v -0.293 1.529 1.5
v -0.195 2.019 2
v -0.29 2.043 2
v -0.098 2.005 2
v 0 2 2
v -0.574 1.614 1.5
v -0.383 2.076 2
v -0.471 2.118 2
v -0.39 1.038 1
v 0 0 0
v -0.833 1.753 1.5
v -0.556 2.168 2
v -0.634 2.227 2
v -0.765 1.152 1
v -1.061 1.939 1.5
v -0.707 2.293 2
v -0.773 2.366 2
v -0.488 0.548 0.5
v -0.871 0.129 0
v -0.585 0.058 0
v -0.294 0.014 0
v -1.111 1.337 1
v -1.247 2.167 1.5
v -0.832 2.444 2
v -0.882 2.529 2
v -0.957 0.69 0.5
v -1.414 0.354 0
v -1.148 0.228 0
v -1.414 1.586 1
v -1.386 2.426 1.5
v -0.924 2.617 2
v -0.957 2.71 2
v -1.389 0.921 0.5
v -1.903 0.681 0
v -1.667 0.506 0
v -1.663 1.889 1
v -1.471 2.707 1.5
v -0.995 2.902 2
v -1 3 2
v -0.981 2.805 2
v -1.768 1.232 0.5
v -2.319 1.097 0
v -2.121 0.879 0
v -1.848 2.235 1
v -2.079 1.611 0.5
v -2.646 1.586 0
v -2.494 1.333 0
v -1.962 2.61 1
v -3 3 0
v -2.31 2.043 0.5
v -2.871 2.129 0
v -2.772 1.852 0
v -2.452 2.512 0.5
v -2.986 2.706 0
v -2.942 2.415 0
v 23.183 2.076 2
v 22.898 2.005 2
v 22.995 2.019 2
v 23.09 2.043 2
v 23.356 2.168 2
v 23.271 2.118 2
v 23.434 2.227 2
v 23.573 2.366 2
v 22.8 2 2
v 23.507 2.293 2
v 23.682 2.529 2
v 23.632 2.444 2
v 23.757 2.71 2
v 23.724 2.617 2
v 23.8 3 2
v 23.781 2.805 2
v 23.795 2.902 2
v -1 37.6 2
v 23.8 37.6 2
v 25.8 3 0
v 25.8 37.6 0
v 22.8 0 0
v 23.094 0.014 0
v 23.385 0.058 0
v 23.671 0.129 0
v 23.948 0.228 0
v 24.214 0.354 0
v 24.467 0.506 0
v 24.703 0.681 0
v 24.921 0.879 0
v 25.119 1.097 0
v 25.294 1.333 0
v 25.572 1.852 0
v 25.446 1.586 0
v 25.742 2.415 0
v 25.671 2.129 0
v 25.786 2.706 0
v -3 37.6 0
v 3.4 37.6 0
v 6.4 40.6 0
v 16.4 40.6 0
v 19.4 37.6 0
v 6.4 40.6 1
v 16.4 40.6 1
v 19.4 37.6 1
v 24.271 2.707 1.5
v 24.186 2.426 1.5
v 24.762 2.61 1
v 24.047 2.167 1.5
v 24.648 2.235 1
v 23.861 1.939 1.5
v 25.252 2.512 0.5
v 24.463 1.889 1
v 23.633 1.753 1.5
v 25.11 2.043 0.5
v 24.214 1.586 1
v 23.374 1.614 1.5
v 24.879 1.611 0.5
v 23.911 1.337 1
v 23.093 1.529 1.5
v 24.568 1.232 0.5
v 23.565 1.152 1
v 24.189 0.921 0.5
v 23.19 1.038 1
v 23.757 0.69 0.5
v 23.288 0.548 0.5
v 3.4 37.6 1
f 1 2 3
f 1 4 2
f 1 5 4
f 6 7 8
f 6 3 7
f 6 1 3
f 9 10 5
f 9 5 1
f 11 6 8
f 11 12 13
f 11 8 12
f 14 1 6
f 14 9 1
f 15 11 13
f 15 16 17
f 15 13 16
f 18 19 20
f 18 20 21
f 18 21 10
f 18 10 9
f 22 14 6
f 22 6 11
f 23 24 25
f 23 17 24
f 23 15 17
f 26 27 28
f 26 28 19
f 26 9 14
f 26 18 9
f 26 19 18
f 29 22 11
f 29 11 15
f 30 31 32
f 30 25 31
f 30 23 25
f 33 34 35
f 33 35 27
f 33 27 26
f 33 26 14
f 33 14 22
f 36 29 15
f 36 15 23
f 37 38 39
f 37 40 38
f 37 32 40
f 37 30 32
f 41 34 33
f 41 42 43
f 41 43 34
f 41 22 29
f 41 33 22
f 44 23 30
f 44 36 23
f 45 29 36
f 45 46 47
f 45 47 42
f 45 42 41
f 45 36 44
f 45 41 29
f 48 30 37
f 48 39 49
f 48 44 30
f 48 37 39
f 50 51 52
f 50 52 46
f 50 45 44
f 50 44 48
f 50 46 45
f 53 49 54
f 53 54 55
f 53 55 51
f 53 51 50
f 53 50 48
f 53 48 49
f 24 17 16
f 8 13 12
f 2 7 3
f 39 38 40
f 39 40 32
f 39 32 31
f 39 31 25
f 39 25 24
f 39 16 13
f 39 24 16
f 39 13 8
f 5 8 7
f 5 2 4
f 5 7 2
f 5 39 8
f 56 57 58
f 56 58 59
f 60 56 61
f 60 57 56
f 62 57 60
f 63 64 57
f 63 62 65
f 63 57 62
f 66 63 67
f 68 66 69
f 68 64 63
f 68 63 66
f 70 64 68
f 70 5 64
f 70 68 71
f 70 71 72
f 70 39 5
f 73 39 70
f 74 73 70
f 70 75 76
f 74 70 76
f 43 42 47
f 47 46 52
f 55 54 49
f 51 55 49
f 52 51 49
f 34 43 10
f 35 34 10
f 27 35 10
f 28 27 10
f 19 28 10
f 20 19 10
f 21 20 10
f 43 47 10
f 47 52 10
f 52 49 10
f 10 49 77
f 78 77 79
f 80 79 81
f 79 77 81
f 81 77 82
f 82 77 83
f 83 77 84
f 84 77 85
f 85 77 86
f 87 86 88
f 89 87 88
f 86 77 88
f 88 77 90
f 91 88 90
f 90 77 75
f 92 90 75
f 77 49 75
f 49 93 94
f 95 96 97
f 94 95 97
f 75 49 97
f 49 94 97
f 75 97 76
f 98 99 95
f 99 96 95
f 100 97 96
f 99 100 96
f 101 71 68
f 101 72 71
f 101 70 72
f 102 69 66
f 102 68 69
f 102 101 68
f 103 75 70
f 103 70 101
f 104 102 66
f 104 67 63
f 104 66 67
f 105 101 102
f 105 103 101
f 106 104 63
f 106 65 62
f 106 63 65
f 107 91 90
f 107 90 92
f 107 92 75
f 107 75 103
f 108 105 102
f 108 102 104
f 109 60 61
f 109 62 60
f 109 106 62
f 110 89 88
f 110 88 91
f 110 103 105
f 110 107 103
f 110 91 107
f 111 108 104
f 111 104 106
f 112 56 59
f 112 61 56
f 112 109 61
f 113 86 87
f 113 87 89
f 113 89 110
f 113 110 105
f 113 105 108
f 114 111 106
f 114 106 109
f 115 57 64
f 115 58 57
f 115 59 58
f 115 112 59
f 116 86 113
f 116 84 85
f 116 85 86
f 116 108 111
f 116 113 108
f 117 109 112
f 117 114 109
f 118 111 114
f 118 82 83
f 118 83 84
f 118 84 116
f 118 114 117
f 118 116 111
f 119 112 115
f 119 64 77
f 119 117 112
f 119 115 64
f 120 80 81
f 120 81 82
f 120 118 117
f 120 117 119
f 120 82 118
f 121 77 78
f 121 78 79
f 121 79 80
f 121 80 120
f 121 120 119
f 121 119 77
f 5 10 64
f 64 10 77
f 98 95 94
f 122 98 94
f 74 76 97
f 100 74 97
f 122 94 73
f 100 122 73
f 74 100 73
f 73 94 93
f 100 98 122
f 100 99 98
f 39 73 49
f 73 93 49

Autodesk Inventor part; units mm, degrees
ref_plane "YZ Plane" through (0, 0, 0) normal (1, 0, 0) x (0, 1, 0)
ref_plane "XZ Plane" through (0, 0, 0) normal (0, 1, 0) x (-1, 0, 0)
ref_plane "XY Plane" through (0, 0, 0) normal (0, 0, 1) x (1, 0, 0)
sketch "Skizze1" plane through (0, 0, 0) normal (0, 0, 1) x (1, 0, 0)
  line L0 (3.4, 37.6) -> (-3, 37.6)
  line L1 (-3, 37.6) -> (-3, 3)
  arc A0 (-3, 3) -> (0, 0) centre (0, 3) ccw
  line L2 (0, 0) -> (22.8, 0)
  arc A1 (22.8, 0) -> (25.8, 3) centre (22.8, 3) ccw
  line L3 (25.8, 3) -> (25.8, 37.6)
  line L4 (25.8, 37.6) -> (19.4, 37.6)
  line L5 (19.4, 37.6) -> (16.4, 40.6)
  line L6 (16.4, 40.6) -> (6.4, 40.6)
  line L7 (6.4, 40.6) -> (3.4, 37.6)
  line L8 (-1.8, 35.6) -> (24.6, 35.6)
  line L9 (24.6, 35.6) -> (24.6, 9.2)
  line L10 (24.6, 9.2) -> (-1.8, 9.2)
  line L11 (-1.8, 9.2) -> (-1.8, 35.6)
  line L12 (24.6, 35.6) -> (-1.8, 35.6)
  line L13 (-1.8, 35.6) -> (-1.8, 9.2)
  line L14 (-1.8, 9.2) -> (24.6, 9.2)
  line L15 (24.6, 9.2) -> (24.6, 35.6)
  line L16 (24.6, 35.6) -> (-1.8, 35.6)
  line L17 (-3, 37.6) -> (3.4, 37.6)
  line L18 (-3, 3) -> (-3, 37.6)
  arc A2 (-3, 3) -> (0, 0) centre (0, 3) ccw
  line L19 (22.8, 0) -> (0, 0)
  arc A3 (22.8, 0) -> (25.8, 3) centre (22.8, 3) ccw
  line L20 (25.8, 37.6) -> (25.8, 3)
  line L21 (19.4, 37.6) -> (25.8, 37.6)
  line L22 (19.4, 37.6) -> (16.4, 40.6)
  line L23 (16.4, 40.6) -> (6.4, 40.6)
  line L24 (6.4, 40.6) -> (3.4, 37.6)
  circle A4 centre (4.1926, 4.6) radius 2
  line L25 (11.4, 35.6) -> (11.4, 0)
  circle A5 centre (18.6074, 4.6) radius 2
  point P0 (-3, 37.6)
  point P1 (-3, 3)
  point P2 (0, 0)
extrude "Extrusion1" add sketch "Skizze1" along normal blind 2 contours L7 L6 L5 L4 L3 A1 L2 A0 L1 L0 | L8 L25 L10 L11 | L8 L9 L10 L25 | A4 | A5
chamfer "Fase1" distance 2 angle 45 5 edges at (25.8, 20.3, 2) (24.9213, 0.8787, 2) (11.4, 0, 2) (-2.1213, 0.8787, 2) (-3, 20.3, 2)
sketch "Skizze2" plane through (0, 0, 2) normal (0, 0, 1) x (1, 0, 0)
  line L0 (-1, 3) -> (-1, 37.6) projected
  arc A0 (-1, 3) -> (0, 2) centre (0, 3) ccw projected
  line L1 (22.8, 2) -> (0, 2) projected
  arc A1 (22.8, 2) -> (23.8, 3) centre (22.8, 3) ccw projected
  line L2 (23.8, 37.6) -> (23.8, 3) projected
  line L3 (23.8, 37.6) -> (19.4, 37.6) projected
  line L4 (19.4, 37.6) -> (16.4, 40.6) projected
  line L5 (16.4, 40.6) -> (6.4, 40.6) projected
  line L6 (6.4, 40.6) -> (3.4, 37.6) projected
  line L7 (3.4, 37.6) -> (-1, 37.6) projected
  line L8 (6.4, 40.6) -> (3.4, 37.6) projected
  line L9 (3.4, 37.6) -> (19.4, 37.6)
  point P0 (0, 0)
extrude "Extrusion2" cut sketch "Skizze2" against normal blind 1 contours L6 L5 L4 L9
properties part number "gps-deckel"
